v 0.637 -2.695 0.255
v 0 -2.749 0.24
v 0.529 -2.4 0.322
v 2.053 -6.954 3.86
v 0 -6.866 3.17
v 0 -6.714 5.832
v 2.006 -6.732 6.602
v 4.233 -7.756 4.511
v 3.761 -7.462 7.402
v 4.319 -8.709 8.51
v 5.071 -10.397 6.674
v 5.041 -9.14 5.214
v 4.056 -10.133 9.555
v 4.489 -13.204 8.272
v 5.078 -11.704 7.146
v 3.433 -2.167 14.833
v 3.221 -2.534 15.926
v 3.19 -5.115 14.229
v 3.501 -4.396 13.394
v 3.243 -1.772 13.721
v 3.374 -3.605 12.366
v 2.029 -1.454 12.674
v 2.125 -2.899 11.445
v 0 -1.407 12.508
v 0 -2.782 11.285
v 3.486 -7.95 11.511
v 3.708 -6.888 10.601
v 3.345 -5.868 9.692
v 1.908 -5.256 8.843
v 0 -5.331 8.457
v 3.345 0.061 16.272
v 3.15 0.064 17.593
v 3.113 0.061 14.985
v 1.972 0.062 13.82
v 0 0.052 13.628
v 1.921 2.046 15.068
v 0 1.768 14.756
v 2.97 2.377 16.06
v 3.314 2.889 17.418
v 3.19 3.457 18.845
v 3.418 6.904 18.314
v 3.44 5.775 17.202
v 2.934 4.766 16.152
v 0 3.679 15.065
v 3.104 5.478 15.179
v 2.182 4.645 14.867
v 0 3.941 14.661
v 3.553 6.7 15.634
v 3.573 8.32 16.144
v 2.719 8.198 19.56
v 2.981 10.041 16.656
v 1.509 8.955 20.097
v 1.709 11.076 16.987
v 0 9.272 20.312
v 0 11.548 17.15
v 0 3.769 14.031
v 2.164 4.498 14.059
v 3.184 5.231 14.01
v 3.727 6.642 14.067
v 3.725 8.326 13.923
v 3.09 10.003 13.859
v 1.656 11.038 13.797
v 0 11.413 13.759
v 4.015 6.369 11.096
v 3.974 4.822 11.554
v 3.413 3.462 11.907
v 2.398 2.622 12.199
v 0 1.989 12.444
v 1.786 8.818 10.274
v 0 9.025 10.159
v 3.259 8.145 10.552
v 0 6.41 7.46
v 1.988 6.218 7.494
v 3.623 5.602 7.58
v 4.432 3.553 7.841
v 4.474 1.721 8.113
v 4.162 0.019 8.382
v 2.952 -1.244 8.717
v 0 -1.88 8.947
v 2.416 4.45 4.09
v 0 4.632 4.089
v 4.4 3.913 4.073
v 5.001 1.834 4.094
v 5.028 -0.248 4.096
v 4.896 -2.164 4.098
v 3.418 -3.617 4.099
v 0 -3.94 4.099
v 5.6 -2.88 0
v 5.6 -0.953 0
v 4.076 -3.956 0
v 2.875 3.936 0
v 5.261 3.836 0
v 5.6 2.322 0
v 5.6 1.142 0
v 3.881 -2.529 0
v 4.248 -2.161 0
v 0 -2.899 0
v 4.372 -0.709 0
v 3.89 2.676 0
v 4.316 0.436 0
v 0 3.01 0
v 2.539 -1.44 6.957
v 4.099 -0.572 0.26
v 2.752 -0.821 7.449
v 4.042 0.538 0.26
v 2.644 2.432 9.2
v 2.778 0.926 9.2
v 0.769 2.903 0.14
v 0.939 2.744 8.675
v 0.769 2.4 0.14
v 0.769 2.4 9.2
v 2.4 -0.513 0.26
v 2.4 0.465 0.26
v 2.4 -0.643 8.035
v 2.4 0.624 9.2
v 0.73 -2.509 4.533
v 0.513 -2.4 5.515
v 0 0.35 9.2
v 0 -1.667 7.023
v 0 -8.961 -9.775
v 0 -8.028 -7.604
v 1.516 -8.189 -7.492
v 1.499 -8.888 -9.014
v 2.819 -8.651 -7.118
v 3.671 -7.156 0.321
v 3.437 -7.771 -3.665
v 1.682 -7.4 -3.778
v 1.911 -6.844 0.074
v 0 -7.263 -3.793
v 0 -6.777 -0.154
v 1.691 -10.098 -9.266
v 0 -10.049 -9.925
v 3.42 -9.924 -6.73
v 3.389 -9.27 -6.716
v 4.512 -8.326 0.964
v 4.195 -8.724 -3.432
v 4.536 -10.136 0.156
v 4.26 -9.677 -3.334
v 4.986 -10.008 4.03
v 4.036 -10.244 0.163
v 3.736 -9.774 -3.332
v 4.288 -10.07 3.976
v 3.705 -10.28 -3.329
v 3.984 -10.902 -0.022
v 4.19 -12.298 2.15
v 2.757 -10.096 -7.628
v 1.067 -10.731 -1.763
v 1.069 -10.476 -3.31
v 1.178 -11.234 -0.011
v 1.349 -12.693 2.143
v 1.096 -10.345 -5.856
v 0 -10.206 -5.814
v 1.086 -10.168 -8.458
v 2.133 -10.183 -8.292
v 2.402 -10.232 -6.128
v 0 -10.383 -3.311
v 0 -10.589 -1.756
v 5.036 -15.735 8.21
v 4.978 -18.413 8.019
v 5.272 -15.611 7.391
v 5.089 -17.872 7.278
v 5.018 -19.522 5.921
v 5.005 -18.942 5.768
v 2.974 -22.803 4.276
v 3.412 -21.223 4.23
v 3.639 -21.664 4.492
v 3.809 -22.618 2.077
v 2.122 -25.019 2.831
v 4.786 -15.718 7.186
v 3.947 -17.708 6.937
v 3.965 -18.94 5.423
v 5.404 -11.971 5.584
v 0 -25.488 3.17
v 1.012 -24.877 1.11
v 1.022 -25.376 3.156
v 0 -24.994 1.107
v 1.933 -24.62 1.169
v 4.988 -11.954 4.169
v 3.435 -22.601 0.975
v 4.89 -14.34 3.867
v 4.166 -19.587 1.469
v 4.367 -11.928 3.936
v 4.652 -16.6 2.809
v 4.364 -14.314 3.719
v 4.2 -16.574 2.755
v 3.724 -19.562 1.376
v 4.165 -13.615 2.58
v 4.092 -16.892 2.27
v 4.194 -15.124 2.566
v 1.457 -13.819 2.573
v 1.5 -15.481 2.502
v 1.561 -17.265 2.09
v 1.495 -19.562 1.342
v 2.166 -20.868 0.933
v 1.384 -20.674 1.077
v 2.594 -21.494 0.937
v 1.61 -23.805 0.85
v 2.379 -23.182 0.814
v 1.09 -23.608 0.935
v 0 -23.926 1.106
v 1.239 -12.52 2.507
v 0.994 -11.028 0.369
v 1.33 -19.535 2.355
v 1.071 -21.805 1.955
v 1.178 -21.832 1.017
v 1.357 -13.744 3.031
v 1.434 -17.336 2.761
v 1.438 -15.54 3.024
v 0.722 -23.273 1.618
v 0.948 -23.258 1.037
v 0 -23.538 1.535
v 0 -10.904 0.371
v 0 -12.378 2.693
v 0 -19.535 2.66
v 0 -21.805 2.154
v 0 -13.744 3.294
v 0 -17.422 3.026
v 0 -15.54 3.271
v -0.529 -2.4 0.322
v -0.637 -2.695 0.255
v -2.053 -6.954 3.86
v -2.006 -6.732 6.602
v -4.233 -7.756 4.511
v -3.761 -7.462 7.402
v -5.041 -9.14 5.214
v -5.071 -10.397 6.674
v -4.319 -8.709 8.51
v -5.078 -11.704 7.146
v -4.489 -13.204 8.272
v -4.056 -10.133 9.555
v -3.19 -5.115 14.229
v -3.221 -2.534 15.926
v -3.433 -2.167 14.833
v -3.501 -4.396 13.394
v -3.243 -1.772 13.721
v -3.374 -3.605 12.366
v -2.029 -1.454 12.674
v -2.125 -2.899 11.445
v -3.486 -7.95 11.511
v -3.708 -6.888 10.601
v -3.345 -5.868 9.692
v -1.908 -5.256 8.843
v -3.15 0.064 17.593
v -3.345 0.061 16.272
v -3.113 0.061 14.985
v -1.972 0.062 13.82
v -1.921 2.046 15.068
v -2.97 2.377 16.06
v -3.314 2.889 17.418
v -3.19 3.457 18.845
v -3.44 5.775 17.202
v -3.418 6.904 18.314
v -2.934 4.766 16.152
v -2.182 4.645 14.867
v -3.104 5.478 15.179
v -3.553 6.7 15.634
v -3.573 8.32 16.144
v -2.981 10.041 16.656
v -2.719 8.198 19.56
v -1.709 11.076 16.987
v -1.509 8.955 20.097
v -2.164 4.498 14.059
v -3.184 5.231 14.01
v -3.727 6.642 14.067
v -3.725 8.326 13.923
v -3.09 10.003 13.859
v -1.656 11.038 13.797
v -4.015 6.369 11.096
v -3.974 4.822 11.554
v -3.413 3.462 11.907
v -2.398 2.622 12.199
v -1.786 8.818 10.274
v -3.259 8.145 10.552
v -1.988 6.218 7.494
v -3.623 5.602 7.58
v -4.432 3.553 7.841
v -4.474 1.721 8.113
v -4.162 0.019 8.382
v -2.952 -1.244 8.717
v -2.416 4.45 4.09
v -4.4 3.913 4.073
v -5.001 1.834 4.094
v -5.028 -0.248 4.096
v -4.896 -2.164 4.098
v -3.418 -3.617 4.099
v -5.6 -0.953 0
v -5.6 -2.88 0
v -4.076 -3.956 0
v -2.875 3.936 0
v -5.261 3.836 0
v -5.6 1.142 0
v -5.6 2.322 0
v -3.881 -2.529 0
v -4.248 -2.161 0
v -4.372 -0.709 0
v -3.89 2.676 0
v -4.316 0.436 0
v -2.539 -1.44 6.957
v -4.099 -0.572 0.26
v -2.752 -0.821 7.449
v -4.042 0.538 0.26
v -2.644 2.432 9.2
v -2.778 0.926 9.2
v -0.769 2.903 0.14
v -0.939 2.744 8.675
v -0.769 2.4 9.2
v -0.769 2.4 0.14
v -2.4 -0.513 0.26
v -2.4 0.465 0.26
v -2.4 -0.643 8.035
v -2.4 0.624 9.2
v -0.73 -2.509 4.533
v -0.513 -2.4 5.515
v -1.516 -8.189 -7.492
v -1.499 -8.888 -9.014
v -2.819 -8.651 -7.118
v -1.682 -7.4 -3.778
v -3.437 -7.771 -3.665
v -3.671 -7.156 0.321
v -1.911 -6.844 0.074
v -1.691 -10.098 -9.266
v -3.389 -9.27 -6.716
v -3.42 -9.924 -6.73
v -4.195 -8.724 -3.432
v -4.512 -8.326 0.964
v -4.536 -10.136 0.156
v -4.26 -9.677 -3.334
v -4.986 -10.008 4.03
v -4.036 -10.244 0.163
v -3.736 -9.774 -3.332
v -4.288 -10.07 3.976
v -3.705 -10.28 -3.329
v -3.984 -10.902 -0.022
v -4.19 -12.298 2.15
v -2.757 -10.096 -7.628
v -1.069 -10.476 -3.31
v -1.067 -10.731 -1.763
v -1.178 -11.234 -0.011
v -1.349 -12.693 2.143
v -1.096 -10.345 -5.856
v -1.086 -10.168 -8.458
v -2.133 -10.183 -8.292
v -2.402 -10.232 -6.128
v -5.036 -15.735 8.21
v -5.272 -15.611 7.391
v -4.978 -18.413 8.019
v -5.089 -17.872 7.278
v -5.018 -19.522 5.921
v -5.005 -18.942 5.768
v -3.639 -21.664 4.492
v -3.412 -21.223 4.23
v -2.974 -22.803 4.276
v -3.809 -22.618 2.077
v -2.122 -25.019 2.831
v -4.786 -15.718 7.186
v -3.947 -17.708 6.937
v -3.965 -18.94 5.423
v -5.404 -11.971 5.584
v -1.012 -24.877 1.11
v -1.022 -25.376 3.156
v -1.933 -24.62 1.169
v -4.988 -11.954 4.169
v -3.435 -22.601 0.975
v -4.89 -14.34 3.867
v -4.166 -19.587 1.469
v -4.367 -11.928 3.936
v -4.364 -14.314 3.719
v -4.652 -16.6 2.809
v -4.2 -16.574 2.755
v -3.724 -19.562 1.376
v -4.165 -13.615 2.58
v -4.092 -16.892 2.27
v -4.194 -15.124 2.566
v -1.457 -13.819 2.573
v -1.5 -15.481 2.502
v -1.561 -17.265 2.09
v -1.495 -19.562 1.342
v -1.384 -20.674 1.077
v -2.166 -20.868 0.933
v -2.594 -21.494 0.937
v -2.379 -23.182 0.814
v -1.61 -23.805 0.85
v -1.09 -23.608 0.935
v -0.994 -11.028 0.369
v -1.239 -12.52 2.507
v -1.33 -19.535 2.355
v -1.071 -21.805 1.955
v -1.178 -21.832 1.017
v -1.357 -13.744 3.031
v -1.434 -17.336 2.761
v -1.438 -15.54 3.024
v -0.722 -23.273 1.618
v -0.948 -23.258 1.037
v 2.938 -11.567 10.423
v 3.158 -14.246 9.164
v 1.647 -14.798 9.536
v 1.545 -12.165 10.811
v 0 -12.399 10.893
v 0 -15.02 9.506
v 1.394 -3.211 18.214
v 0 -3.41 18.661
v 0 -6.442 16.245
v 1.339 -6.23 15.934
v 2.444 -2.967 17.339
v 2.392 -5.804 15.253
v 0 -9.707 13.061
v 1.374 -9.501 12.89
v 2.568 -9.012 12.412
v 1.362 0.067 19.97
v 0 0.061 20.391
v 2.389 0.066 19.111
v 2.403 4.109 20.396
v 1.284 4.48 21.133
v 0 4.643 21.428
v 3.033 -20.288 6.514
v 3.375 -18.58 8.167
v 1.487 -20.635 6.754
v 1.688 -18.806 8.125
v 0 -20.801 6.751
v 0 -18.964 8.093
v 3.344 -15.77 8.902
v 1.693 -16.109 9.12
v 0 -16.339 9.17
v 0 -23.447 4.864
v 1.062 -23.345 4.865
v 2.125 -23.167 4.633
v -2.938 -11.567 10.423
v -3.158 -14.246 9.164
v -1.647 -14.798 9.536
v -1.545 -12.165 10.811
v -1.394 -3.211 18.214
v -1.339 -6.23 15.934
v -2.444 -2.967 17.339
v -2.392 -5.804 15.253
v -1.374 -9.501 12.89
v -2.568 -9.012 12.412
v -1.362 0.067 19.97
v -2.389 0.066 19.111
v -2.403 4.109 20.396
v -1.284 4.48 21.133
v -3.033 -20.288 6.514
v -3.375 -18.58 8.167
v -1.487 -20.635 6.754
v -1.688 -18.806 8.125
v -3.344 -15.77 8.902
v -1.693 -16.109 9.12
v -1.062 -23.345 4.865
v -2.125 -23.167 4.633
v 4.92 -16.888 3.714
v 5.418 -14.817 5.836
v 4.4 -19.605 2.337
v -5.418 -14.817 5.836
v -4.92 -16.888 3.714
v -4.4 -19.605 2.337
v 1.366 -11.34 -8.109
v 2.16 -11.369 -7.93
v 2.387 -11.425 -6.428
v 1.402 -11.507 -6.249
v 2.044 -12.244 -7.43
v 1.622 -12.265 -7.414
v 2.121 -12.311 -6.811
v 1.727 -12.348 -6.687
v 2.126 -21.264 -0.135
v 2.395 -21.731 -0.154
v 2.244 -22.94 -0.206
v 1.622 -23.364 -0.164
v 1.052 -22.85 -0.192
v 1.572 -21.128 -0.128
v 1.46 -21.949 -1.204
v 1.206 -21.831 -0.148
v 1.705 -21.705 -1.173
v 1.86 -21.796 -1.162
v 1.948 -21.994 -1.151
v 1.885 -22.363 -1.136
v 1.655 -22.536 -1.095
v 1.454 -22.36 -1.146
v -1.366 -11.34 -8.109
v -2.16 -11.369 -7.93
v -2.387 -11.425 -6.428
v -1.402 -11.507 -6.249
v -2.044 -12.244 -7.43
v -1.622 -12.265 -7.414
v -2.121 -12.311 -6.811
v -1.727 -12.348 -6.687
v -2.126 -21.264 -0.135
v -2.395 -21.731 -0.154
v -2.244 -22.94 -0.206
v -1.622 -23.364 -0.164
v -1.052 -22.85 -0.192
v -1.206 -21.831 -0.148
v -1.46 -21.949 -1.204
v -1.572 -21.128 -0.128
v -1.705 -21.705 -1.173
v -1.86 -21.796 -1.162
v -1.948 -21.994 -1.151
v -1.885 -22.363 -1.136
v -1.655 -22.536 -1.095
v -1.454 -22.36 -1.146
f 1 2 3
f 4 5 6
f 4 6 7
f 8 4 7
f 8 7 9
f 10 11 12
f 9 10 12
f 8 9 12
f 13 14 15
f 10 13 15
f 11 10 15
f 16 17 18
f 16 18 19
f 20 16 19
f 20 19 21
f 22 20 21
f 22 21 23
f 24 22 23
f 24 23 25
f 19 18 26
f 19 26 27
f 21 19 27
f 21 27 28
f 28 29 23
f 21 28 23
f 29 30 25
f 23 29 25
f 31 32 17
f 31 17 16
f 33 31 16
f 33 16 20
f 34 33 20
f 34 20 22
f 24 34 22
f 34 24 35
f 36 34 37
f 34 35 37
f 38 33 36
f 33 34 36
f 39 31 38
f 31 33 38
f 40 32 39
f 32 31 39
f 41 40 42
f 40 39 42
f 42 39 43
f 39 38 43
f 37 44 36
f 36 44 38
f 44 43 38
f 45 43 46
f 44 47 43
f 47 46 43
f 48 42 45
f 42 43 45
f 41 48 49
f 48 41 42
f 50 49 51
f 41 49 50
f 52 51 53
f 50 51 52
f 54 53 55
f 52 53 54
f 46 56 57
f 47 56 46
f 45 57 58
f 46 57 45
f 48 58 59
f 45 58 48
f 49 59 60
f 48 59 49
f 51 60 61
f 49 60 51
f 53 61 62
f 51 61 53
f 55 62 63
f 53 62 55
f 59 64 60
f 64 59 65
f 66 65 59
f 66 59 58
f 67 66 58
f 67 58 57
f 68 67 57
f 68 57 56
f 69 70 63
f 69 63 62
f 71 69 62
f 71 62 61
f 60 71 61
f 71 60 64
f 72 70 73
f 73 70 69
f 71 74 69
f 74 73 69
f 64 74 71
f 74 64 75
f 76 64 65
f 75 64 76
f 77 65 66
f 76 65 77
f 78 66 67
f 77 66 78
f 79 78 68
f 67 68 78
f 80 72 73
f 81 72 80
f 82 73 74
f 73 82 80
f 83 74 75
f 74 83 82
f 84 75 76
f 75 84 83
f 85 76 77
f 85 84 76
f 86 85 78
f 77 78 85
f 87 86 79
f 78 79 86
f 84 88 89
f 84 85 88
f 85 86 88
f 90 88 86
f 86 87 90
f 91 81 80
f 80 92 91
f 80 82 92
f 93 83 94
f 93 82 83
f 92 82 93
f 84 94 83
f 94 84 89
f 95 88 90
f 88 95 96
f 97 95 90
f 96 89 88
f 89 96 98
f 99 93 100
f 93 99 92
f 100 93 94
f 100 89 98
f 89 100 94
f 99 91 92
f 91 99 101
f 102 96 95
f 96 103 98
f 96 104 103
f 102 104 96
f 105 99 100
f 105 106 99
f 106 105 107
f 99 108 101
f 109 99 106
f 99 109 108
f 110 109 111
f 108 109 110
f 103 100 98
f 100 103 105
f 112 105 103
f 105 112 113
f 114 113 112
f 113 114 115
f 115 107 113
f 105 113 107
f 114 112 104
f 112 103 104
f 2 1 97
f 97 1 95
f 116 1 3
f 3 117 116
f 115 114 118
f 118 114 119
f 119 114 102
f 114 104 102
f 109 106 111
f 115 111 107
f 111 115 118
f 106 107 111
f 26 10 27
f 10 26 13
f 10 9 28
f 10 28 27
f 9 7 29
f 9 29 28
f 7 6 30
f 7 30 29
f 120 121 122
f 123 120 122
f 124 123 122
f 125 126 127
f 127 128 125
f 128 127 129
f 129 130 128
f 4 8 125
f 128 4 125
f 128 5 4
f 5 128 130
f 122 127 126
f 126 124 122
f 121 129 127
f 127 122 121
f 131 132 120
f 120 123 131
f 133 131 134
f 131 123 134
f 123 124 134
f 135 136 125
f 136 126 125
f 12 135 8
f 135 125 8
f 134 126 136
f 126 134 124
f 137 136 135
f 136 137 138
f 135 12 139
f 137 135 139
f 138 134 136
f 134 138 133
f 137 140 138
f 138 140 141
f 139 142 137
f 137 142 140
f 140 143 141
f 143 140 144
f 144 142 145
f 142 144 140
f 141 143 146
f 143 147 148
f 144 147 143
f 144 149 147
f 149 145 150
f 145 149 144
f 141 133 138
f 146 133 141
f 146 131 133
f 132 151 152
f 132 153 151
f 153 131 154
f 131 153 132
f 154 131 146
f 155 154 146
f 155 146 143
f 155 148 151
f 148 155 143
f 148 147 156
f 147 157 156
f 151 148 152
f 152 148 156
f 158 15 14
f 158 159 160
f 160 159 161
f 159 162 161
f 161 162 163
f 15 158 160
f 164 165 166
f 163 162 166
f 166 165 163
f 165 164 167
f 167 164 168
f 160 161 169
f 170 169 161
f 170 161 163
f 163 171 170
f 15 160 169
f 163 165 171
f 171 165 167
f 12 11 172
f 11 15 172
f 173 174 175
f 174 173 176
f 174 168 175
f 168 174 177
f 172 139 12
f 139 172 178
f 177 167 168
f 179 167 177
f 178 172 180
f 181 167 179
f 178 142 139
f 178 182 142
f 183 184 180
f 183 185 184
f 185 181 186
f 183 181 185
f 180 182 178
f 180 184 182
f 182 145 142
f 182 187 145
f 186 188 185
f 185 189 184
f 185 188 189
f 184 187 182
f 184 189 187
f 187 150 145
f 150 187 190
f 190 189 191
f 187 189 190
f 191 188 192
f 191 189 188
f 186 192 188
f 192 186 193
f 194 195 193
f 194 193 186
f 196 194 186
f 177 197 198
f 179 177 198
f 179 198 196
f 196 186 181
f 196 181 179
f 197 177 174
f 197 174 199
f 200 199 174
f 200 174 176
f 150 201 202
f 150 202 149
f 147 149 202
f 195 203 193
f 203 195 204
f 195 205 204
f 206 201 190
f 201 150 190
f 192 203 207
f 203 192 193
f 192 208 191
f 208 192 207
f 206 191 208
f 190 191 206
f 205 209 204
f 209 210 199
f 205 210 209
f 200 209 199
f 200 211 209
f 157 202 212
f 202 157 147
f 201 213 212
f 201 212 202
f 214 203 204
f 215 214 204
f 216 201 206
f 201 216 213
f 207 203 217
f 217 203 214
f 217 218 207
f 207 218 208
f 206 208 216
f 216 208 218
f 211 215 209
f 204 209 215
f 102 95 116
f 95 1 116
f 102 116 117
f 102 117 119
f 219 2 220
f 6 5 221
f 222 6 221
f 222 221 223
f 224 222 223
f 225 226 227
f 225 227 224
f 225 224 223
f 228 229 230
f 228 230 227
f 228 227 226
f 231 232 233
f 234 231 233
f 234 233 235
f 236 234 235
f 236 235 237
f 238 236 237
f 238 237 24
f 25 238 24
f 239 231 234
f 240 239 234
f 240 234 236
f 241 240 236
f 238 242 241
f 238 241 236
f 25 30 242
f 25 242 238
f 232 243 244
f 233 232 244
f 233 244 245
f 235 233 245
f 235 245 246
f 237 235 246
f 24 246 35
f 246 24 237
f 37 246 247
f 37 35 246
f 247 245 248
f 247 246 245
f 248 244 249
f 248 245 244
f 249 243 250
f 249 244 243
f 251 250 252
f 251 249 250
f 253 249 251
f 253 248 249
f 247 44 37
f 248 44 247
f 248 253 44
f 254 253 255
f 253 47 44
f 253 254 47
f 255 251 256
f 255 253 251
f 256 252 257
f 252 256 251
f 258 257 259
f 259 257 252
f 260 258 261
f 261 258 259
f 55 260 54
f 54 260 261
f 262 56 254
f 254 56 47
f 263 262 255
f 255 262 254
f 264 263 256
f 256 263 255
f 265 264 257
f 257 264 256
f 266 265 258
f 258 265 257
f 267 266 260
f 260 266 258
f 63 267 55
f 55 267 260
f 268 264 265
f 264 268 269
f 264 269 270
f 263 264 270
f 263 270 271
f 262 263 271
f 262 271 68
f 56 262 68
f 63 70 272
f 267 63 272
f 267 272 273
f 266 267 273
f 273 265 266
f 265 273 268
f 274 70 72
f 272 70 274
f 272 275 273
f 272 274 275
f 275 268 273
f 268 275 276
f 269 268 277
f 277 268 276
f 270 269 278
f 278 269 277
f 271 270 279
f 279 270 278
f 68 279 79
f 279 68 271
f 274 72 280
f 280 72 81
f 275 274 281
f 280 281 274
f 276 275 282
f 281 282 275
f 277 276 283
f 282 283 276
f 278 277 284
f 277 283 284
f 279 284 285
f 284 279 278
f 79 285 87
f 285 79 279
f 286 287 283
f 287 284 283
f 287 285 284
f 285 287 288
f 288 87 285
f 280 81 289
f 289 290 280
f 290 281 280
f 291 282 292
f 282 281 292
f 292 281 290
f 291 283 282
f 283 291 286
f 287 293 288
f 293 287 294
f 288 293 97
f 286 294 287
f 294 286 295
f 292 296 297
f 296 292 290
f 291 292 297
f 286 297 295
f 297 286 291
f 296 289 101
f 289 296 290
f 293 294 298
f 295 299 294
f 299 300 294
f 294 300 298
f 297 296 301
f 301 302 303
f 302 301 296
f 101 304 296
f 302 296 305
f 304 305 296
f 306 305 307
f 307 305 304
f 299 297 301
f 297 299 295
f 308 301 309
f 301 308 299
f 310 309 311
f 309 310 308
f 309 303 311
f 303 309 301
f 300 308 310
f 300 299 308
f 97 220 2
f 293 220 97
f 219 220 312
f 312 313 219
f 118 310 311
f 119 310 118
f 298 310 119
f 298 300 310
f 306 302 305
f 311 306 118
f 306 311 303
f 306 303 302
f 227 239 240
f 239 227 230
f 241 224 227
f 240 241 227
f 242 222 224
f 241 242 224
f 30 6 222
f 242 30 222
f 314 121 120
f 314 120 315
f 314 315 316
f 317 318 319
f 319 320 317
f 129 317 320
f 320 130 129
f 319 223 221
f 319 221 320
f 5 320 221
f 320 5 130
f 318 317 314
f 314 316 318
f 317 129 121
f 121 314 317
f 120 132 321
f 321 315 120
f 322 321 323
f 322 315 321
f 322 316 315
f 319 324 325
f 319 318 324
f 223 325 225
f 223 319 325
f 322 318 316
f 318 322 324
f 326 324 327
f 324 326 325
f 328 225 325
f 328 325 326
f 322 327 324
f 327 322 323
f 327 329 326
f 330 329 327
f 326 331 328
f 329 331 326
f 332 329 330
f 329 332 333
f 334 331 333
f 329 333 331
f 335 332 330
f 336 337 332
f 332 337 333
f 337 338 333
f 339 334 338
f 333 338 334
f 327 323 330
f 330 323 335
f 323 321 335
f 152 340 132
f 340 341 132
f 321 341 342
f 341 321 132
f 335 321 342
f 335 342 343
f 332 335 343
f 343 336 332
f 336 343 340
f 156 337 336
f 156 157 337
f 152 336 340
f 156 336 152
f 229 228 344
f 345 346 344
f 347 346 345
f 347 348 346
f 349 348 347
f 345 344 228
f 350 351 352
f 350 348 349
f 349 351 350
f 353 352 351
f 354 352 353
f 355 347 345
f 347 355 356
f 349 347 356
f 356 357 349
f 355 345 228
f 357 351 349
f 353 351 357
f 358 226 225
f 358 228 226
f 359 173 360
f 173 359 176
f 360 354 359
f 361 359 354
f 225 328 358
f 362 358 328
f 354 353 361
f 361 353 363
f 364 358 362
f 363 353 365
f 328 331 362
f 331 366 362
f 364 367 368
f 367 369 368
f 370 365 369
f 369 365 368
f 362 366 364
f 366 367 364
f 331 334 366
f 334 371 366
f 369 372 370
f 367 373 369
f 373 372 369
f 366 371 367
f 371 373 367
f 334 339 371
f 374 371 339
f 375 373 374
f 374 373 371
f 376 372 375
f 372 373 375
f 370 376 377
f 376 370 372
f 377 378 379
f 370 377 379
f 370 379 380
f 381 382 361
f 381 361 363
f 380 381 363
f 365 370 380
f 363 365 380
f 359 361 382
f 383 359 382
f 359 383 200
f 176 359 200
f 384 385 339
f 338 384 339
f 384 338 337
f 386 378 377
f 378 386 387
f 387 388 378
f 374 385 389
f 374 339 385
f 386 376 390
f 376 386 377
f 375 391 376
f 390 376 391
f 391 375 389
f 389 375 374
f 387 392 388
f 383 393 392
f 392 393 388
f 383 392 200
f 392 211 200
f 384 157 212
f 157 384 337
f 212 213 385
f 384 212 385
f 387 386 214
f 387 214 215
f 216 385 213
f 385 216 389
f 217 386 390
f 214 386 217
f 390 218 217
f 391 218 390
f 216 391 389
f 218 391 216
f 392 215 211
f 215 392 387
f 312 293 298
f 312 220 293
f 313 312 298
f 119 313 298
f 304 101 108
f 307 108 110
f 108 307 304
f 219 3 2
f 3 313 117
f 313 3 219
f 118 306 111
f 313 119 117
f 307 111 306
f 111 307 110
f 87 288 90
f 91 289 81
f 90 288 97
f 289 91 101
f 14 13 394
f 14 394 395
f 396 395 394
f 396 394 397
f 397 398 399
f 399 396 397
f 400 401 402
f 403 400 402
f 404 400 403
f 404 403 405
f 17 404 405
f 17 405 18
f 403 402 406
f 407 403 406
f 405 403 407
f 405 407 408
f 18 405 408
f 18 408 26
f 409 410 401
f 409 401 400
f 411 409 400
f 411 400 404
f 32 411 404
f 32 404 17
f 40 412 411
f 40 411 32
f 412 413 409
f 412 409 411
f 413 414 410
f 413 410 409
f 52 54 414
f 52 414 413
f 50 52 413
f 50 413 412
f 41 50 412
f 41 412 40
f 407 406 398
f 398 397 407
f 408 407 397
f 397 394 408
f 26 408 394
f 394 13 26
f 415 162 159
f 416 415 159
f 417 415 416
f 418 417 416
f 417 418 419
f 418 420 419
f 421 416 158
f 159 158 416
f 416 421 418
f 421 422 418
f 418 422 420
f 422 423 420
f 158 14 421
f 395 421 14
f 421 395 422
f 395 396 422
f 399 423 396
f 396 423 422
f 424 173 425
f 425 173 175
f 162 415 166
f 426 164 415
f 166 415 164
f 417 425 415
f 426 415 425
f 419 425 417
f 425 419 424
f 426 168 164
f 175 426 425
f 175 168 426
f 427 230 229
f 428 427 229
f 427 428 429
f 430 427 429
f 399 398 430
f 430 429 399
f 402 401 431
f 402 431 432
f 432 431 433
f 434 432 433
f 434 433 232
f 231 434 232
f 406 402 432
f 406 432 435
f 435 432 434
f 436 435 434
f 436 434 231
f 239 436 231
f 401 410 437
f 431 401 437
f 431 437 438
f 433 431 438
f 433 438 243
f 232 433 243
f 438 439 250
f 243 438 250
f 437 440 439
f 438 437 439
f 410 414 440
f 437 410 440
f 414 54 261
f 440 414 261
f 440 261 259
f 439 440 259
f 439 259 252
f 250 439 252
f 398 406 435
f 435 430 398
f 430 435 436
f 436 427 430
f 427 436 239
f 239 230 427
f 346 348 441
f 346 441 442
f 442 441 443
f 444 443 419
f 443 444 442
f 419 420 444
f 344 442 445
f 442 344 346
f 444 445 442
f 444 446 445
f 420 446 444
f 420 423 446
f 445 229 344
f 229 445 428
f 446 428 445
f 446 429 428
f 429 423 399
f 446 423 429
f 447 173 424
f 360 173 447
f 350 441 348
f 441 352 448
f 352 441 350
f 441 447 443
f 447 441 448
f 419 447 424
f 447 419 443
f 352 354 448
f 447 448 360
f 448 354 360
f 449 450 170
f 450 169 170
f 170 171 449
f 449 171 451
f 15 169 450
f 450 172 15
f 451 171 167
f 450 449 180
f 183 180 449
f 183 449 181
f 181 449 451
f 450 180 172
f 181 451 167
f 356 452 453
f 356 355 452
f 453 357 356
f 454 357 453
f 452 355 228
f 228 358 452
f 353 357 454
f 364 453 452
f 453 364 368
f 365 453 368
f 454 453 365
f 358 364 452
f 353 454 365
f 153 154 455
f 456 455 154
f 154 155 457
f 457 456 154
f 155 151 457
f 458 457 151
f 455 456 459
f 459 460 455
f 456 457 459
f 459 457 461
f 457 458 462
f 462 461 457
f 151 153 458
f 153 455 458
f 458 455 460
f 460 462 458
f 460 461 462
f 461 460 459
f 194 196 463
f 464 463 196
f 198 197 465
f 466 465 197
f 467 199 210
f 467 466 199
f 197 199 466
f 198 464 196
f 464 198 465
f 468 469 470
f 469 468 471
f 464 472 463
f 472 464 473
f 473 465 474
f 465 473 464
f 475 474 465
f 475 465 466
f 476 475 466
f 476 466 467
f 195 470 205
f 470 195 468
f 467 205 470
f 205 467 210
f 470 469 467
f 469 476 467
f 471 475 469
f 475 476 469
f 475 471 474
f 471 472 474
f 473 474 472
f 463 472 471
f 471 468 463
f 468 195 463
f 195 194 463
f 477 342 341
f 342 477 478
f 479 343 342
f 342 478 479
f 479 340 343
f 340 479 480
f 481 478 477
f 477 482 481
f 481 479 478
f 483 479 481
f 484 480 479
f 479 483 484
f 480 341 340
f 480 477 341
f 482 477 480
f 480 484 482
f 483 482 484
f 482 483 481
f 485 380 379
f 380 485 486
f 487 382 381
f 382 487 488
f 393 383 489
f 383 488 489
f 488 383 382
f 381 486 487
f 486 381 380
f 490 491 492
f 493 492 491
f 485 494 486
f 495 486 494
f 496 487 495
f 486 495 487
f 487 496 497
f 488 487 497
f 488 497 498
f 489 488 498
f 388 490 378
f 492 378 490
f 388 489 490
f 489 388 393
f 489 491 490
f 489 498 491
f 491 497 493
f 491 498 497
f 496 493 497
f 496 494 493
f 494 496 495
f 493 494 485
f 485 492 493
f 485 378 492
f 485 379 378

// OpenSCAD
use <../lib.scad>
use <s/98154s01.scad>
use <s/98154s03.scad>
use <s/98154s04.scad>
use <s/98154s05.scad>
function ldraw_lib__98154() = [
// 0 Minifig Head Snake Long Neck with Open Mouth
// 0 Name: 98154.dat
// 0 Author: Magnus Forsberg [MagFors]
// 0 !LDRAW_ORG Part UPDATE 2025-05
// 0 !LICENSE Licensed under CC BY 4.0 : see CAreadme.txt
// 
// 0 !HELP in LDD as 99818,
// 
// 0 BFC CERTIFY CCW
  [0,"BFC","CERTIFY"],
  [0,"BFC","CCW"],
// 
// 0 !KEYWORDS Pythor
// 
// 0 !HISTORY 2013-08-14 {LEGO Digital Designer} Original part shape
// 0 !HISTORY 2022-06-28 [MagFors] File preparation for LDraw Parts Tracker
// 0 !HISTORY 2025-05-28 [OrionP] Official Update 2025-05
// 
// 
// 1 16 0 0 0 1 0 0 0 1 0 0 0 1 s\98154s01.dat
  [1,16,0,0,0,1,0,0,0,1,0,0,0,1, ldraw_lib__s__98154s01()],
// 1 16 0 0 0 1 0 0 0 1 0 0 0 1 s\98154s03.dat
  [1,16,0,0,0,1,0,0,0,1,0,0,0,1, ldraw_lib__s__98154s03()],
// 1 16 0 0 0 -1 0 0 0 1 0 0 0 1 s\98154s03.dat
  [1,16,0,0,0,-1,0,0,0,1,0,0,0,1, ldraw_lib__s__98154s03()],
// 1 16 0 0 0 1 0 0 0 1 0 0 0 1 s\98154s04.dat
  [1,16,0,0,0,1,0,0,0,1,0,0,0,1, ldraw_lib__s__98154s04()],
// 1 16 0 0 0 -1 0 0 0 1 0 0 0 1 s\98154s04.dat
  [1,16,0,0,0,-1,0,0,0,1,0,0,0,1, ldraw_lib__s__98154s04()],
// 1 16 0 0 0 1 0 0 0 1 0 0 0 1 s\98154s05.dat
  [1,16,0,0,0,1,0,0,0,1,0,0,0,1, ldraw_lib__s__98154s05()],
// 1 16 0 0 0 -1 0 0 0 1 0 0 0 1 s\98154s05.dat
  [1,16,0,0,0,-1,0,0,0,1,0,0,0,1, ldraw_lib__s__98154s05()],
];
module ldraw_lib__98154(step=0, col=false, unit=2/5, alt=false, line=0.2, solid=!$preview)
    makepoly(ldraw_lib__98154(), step=step, col=col, unit=unit, alt=alt, line=line, solid=solid);
ldraw_lib__98154(line=0.2);
